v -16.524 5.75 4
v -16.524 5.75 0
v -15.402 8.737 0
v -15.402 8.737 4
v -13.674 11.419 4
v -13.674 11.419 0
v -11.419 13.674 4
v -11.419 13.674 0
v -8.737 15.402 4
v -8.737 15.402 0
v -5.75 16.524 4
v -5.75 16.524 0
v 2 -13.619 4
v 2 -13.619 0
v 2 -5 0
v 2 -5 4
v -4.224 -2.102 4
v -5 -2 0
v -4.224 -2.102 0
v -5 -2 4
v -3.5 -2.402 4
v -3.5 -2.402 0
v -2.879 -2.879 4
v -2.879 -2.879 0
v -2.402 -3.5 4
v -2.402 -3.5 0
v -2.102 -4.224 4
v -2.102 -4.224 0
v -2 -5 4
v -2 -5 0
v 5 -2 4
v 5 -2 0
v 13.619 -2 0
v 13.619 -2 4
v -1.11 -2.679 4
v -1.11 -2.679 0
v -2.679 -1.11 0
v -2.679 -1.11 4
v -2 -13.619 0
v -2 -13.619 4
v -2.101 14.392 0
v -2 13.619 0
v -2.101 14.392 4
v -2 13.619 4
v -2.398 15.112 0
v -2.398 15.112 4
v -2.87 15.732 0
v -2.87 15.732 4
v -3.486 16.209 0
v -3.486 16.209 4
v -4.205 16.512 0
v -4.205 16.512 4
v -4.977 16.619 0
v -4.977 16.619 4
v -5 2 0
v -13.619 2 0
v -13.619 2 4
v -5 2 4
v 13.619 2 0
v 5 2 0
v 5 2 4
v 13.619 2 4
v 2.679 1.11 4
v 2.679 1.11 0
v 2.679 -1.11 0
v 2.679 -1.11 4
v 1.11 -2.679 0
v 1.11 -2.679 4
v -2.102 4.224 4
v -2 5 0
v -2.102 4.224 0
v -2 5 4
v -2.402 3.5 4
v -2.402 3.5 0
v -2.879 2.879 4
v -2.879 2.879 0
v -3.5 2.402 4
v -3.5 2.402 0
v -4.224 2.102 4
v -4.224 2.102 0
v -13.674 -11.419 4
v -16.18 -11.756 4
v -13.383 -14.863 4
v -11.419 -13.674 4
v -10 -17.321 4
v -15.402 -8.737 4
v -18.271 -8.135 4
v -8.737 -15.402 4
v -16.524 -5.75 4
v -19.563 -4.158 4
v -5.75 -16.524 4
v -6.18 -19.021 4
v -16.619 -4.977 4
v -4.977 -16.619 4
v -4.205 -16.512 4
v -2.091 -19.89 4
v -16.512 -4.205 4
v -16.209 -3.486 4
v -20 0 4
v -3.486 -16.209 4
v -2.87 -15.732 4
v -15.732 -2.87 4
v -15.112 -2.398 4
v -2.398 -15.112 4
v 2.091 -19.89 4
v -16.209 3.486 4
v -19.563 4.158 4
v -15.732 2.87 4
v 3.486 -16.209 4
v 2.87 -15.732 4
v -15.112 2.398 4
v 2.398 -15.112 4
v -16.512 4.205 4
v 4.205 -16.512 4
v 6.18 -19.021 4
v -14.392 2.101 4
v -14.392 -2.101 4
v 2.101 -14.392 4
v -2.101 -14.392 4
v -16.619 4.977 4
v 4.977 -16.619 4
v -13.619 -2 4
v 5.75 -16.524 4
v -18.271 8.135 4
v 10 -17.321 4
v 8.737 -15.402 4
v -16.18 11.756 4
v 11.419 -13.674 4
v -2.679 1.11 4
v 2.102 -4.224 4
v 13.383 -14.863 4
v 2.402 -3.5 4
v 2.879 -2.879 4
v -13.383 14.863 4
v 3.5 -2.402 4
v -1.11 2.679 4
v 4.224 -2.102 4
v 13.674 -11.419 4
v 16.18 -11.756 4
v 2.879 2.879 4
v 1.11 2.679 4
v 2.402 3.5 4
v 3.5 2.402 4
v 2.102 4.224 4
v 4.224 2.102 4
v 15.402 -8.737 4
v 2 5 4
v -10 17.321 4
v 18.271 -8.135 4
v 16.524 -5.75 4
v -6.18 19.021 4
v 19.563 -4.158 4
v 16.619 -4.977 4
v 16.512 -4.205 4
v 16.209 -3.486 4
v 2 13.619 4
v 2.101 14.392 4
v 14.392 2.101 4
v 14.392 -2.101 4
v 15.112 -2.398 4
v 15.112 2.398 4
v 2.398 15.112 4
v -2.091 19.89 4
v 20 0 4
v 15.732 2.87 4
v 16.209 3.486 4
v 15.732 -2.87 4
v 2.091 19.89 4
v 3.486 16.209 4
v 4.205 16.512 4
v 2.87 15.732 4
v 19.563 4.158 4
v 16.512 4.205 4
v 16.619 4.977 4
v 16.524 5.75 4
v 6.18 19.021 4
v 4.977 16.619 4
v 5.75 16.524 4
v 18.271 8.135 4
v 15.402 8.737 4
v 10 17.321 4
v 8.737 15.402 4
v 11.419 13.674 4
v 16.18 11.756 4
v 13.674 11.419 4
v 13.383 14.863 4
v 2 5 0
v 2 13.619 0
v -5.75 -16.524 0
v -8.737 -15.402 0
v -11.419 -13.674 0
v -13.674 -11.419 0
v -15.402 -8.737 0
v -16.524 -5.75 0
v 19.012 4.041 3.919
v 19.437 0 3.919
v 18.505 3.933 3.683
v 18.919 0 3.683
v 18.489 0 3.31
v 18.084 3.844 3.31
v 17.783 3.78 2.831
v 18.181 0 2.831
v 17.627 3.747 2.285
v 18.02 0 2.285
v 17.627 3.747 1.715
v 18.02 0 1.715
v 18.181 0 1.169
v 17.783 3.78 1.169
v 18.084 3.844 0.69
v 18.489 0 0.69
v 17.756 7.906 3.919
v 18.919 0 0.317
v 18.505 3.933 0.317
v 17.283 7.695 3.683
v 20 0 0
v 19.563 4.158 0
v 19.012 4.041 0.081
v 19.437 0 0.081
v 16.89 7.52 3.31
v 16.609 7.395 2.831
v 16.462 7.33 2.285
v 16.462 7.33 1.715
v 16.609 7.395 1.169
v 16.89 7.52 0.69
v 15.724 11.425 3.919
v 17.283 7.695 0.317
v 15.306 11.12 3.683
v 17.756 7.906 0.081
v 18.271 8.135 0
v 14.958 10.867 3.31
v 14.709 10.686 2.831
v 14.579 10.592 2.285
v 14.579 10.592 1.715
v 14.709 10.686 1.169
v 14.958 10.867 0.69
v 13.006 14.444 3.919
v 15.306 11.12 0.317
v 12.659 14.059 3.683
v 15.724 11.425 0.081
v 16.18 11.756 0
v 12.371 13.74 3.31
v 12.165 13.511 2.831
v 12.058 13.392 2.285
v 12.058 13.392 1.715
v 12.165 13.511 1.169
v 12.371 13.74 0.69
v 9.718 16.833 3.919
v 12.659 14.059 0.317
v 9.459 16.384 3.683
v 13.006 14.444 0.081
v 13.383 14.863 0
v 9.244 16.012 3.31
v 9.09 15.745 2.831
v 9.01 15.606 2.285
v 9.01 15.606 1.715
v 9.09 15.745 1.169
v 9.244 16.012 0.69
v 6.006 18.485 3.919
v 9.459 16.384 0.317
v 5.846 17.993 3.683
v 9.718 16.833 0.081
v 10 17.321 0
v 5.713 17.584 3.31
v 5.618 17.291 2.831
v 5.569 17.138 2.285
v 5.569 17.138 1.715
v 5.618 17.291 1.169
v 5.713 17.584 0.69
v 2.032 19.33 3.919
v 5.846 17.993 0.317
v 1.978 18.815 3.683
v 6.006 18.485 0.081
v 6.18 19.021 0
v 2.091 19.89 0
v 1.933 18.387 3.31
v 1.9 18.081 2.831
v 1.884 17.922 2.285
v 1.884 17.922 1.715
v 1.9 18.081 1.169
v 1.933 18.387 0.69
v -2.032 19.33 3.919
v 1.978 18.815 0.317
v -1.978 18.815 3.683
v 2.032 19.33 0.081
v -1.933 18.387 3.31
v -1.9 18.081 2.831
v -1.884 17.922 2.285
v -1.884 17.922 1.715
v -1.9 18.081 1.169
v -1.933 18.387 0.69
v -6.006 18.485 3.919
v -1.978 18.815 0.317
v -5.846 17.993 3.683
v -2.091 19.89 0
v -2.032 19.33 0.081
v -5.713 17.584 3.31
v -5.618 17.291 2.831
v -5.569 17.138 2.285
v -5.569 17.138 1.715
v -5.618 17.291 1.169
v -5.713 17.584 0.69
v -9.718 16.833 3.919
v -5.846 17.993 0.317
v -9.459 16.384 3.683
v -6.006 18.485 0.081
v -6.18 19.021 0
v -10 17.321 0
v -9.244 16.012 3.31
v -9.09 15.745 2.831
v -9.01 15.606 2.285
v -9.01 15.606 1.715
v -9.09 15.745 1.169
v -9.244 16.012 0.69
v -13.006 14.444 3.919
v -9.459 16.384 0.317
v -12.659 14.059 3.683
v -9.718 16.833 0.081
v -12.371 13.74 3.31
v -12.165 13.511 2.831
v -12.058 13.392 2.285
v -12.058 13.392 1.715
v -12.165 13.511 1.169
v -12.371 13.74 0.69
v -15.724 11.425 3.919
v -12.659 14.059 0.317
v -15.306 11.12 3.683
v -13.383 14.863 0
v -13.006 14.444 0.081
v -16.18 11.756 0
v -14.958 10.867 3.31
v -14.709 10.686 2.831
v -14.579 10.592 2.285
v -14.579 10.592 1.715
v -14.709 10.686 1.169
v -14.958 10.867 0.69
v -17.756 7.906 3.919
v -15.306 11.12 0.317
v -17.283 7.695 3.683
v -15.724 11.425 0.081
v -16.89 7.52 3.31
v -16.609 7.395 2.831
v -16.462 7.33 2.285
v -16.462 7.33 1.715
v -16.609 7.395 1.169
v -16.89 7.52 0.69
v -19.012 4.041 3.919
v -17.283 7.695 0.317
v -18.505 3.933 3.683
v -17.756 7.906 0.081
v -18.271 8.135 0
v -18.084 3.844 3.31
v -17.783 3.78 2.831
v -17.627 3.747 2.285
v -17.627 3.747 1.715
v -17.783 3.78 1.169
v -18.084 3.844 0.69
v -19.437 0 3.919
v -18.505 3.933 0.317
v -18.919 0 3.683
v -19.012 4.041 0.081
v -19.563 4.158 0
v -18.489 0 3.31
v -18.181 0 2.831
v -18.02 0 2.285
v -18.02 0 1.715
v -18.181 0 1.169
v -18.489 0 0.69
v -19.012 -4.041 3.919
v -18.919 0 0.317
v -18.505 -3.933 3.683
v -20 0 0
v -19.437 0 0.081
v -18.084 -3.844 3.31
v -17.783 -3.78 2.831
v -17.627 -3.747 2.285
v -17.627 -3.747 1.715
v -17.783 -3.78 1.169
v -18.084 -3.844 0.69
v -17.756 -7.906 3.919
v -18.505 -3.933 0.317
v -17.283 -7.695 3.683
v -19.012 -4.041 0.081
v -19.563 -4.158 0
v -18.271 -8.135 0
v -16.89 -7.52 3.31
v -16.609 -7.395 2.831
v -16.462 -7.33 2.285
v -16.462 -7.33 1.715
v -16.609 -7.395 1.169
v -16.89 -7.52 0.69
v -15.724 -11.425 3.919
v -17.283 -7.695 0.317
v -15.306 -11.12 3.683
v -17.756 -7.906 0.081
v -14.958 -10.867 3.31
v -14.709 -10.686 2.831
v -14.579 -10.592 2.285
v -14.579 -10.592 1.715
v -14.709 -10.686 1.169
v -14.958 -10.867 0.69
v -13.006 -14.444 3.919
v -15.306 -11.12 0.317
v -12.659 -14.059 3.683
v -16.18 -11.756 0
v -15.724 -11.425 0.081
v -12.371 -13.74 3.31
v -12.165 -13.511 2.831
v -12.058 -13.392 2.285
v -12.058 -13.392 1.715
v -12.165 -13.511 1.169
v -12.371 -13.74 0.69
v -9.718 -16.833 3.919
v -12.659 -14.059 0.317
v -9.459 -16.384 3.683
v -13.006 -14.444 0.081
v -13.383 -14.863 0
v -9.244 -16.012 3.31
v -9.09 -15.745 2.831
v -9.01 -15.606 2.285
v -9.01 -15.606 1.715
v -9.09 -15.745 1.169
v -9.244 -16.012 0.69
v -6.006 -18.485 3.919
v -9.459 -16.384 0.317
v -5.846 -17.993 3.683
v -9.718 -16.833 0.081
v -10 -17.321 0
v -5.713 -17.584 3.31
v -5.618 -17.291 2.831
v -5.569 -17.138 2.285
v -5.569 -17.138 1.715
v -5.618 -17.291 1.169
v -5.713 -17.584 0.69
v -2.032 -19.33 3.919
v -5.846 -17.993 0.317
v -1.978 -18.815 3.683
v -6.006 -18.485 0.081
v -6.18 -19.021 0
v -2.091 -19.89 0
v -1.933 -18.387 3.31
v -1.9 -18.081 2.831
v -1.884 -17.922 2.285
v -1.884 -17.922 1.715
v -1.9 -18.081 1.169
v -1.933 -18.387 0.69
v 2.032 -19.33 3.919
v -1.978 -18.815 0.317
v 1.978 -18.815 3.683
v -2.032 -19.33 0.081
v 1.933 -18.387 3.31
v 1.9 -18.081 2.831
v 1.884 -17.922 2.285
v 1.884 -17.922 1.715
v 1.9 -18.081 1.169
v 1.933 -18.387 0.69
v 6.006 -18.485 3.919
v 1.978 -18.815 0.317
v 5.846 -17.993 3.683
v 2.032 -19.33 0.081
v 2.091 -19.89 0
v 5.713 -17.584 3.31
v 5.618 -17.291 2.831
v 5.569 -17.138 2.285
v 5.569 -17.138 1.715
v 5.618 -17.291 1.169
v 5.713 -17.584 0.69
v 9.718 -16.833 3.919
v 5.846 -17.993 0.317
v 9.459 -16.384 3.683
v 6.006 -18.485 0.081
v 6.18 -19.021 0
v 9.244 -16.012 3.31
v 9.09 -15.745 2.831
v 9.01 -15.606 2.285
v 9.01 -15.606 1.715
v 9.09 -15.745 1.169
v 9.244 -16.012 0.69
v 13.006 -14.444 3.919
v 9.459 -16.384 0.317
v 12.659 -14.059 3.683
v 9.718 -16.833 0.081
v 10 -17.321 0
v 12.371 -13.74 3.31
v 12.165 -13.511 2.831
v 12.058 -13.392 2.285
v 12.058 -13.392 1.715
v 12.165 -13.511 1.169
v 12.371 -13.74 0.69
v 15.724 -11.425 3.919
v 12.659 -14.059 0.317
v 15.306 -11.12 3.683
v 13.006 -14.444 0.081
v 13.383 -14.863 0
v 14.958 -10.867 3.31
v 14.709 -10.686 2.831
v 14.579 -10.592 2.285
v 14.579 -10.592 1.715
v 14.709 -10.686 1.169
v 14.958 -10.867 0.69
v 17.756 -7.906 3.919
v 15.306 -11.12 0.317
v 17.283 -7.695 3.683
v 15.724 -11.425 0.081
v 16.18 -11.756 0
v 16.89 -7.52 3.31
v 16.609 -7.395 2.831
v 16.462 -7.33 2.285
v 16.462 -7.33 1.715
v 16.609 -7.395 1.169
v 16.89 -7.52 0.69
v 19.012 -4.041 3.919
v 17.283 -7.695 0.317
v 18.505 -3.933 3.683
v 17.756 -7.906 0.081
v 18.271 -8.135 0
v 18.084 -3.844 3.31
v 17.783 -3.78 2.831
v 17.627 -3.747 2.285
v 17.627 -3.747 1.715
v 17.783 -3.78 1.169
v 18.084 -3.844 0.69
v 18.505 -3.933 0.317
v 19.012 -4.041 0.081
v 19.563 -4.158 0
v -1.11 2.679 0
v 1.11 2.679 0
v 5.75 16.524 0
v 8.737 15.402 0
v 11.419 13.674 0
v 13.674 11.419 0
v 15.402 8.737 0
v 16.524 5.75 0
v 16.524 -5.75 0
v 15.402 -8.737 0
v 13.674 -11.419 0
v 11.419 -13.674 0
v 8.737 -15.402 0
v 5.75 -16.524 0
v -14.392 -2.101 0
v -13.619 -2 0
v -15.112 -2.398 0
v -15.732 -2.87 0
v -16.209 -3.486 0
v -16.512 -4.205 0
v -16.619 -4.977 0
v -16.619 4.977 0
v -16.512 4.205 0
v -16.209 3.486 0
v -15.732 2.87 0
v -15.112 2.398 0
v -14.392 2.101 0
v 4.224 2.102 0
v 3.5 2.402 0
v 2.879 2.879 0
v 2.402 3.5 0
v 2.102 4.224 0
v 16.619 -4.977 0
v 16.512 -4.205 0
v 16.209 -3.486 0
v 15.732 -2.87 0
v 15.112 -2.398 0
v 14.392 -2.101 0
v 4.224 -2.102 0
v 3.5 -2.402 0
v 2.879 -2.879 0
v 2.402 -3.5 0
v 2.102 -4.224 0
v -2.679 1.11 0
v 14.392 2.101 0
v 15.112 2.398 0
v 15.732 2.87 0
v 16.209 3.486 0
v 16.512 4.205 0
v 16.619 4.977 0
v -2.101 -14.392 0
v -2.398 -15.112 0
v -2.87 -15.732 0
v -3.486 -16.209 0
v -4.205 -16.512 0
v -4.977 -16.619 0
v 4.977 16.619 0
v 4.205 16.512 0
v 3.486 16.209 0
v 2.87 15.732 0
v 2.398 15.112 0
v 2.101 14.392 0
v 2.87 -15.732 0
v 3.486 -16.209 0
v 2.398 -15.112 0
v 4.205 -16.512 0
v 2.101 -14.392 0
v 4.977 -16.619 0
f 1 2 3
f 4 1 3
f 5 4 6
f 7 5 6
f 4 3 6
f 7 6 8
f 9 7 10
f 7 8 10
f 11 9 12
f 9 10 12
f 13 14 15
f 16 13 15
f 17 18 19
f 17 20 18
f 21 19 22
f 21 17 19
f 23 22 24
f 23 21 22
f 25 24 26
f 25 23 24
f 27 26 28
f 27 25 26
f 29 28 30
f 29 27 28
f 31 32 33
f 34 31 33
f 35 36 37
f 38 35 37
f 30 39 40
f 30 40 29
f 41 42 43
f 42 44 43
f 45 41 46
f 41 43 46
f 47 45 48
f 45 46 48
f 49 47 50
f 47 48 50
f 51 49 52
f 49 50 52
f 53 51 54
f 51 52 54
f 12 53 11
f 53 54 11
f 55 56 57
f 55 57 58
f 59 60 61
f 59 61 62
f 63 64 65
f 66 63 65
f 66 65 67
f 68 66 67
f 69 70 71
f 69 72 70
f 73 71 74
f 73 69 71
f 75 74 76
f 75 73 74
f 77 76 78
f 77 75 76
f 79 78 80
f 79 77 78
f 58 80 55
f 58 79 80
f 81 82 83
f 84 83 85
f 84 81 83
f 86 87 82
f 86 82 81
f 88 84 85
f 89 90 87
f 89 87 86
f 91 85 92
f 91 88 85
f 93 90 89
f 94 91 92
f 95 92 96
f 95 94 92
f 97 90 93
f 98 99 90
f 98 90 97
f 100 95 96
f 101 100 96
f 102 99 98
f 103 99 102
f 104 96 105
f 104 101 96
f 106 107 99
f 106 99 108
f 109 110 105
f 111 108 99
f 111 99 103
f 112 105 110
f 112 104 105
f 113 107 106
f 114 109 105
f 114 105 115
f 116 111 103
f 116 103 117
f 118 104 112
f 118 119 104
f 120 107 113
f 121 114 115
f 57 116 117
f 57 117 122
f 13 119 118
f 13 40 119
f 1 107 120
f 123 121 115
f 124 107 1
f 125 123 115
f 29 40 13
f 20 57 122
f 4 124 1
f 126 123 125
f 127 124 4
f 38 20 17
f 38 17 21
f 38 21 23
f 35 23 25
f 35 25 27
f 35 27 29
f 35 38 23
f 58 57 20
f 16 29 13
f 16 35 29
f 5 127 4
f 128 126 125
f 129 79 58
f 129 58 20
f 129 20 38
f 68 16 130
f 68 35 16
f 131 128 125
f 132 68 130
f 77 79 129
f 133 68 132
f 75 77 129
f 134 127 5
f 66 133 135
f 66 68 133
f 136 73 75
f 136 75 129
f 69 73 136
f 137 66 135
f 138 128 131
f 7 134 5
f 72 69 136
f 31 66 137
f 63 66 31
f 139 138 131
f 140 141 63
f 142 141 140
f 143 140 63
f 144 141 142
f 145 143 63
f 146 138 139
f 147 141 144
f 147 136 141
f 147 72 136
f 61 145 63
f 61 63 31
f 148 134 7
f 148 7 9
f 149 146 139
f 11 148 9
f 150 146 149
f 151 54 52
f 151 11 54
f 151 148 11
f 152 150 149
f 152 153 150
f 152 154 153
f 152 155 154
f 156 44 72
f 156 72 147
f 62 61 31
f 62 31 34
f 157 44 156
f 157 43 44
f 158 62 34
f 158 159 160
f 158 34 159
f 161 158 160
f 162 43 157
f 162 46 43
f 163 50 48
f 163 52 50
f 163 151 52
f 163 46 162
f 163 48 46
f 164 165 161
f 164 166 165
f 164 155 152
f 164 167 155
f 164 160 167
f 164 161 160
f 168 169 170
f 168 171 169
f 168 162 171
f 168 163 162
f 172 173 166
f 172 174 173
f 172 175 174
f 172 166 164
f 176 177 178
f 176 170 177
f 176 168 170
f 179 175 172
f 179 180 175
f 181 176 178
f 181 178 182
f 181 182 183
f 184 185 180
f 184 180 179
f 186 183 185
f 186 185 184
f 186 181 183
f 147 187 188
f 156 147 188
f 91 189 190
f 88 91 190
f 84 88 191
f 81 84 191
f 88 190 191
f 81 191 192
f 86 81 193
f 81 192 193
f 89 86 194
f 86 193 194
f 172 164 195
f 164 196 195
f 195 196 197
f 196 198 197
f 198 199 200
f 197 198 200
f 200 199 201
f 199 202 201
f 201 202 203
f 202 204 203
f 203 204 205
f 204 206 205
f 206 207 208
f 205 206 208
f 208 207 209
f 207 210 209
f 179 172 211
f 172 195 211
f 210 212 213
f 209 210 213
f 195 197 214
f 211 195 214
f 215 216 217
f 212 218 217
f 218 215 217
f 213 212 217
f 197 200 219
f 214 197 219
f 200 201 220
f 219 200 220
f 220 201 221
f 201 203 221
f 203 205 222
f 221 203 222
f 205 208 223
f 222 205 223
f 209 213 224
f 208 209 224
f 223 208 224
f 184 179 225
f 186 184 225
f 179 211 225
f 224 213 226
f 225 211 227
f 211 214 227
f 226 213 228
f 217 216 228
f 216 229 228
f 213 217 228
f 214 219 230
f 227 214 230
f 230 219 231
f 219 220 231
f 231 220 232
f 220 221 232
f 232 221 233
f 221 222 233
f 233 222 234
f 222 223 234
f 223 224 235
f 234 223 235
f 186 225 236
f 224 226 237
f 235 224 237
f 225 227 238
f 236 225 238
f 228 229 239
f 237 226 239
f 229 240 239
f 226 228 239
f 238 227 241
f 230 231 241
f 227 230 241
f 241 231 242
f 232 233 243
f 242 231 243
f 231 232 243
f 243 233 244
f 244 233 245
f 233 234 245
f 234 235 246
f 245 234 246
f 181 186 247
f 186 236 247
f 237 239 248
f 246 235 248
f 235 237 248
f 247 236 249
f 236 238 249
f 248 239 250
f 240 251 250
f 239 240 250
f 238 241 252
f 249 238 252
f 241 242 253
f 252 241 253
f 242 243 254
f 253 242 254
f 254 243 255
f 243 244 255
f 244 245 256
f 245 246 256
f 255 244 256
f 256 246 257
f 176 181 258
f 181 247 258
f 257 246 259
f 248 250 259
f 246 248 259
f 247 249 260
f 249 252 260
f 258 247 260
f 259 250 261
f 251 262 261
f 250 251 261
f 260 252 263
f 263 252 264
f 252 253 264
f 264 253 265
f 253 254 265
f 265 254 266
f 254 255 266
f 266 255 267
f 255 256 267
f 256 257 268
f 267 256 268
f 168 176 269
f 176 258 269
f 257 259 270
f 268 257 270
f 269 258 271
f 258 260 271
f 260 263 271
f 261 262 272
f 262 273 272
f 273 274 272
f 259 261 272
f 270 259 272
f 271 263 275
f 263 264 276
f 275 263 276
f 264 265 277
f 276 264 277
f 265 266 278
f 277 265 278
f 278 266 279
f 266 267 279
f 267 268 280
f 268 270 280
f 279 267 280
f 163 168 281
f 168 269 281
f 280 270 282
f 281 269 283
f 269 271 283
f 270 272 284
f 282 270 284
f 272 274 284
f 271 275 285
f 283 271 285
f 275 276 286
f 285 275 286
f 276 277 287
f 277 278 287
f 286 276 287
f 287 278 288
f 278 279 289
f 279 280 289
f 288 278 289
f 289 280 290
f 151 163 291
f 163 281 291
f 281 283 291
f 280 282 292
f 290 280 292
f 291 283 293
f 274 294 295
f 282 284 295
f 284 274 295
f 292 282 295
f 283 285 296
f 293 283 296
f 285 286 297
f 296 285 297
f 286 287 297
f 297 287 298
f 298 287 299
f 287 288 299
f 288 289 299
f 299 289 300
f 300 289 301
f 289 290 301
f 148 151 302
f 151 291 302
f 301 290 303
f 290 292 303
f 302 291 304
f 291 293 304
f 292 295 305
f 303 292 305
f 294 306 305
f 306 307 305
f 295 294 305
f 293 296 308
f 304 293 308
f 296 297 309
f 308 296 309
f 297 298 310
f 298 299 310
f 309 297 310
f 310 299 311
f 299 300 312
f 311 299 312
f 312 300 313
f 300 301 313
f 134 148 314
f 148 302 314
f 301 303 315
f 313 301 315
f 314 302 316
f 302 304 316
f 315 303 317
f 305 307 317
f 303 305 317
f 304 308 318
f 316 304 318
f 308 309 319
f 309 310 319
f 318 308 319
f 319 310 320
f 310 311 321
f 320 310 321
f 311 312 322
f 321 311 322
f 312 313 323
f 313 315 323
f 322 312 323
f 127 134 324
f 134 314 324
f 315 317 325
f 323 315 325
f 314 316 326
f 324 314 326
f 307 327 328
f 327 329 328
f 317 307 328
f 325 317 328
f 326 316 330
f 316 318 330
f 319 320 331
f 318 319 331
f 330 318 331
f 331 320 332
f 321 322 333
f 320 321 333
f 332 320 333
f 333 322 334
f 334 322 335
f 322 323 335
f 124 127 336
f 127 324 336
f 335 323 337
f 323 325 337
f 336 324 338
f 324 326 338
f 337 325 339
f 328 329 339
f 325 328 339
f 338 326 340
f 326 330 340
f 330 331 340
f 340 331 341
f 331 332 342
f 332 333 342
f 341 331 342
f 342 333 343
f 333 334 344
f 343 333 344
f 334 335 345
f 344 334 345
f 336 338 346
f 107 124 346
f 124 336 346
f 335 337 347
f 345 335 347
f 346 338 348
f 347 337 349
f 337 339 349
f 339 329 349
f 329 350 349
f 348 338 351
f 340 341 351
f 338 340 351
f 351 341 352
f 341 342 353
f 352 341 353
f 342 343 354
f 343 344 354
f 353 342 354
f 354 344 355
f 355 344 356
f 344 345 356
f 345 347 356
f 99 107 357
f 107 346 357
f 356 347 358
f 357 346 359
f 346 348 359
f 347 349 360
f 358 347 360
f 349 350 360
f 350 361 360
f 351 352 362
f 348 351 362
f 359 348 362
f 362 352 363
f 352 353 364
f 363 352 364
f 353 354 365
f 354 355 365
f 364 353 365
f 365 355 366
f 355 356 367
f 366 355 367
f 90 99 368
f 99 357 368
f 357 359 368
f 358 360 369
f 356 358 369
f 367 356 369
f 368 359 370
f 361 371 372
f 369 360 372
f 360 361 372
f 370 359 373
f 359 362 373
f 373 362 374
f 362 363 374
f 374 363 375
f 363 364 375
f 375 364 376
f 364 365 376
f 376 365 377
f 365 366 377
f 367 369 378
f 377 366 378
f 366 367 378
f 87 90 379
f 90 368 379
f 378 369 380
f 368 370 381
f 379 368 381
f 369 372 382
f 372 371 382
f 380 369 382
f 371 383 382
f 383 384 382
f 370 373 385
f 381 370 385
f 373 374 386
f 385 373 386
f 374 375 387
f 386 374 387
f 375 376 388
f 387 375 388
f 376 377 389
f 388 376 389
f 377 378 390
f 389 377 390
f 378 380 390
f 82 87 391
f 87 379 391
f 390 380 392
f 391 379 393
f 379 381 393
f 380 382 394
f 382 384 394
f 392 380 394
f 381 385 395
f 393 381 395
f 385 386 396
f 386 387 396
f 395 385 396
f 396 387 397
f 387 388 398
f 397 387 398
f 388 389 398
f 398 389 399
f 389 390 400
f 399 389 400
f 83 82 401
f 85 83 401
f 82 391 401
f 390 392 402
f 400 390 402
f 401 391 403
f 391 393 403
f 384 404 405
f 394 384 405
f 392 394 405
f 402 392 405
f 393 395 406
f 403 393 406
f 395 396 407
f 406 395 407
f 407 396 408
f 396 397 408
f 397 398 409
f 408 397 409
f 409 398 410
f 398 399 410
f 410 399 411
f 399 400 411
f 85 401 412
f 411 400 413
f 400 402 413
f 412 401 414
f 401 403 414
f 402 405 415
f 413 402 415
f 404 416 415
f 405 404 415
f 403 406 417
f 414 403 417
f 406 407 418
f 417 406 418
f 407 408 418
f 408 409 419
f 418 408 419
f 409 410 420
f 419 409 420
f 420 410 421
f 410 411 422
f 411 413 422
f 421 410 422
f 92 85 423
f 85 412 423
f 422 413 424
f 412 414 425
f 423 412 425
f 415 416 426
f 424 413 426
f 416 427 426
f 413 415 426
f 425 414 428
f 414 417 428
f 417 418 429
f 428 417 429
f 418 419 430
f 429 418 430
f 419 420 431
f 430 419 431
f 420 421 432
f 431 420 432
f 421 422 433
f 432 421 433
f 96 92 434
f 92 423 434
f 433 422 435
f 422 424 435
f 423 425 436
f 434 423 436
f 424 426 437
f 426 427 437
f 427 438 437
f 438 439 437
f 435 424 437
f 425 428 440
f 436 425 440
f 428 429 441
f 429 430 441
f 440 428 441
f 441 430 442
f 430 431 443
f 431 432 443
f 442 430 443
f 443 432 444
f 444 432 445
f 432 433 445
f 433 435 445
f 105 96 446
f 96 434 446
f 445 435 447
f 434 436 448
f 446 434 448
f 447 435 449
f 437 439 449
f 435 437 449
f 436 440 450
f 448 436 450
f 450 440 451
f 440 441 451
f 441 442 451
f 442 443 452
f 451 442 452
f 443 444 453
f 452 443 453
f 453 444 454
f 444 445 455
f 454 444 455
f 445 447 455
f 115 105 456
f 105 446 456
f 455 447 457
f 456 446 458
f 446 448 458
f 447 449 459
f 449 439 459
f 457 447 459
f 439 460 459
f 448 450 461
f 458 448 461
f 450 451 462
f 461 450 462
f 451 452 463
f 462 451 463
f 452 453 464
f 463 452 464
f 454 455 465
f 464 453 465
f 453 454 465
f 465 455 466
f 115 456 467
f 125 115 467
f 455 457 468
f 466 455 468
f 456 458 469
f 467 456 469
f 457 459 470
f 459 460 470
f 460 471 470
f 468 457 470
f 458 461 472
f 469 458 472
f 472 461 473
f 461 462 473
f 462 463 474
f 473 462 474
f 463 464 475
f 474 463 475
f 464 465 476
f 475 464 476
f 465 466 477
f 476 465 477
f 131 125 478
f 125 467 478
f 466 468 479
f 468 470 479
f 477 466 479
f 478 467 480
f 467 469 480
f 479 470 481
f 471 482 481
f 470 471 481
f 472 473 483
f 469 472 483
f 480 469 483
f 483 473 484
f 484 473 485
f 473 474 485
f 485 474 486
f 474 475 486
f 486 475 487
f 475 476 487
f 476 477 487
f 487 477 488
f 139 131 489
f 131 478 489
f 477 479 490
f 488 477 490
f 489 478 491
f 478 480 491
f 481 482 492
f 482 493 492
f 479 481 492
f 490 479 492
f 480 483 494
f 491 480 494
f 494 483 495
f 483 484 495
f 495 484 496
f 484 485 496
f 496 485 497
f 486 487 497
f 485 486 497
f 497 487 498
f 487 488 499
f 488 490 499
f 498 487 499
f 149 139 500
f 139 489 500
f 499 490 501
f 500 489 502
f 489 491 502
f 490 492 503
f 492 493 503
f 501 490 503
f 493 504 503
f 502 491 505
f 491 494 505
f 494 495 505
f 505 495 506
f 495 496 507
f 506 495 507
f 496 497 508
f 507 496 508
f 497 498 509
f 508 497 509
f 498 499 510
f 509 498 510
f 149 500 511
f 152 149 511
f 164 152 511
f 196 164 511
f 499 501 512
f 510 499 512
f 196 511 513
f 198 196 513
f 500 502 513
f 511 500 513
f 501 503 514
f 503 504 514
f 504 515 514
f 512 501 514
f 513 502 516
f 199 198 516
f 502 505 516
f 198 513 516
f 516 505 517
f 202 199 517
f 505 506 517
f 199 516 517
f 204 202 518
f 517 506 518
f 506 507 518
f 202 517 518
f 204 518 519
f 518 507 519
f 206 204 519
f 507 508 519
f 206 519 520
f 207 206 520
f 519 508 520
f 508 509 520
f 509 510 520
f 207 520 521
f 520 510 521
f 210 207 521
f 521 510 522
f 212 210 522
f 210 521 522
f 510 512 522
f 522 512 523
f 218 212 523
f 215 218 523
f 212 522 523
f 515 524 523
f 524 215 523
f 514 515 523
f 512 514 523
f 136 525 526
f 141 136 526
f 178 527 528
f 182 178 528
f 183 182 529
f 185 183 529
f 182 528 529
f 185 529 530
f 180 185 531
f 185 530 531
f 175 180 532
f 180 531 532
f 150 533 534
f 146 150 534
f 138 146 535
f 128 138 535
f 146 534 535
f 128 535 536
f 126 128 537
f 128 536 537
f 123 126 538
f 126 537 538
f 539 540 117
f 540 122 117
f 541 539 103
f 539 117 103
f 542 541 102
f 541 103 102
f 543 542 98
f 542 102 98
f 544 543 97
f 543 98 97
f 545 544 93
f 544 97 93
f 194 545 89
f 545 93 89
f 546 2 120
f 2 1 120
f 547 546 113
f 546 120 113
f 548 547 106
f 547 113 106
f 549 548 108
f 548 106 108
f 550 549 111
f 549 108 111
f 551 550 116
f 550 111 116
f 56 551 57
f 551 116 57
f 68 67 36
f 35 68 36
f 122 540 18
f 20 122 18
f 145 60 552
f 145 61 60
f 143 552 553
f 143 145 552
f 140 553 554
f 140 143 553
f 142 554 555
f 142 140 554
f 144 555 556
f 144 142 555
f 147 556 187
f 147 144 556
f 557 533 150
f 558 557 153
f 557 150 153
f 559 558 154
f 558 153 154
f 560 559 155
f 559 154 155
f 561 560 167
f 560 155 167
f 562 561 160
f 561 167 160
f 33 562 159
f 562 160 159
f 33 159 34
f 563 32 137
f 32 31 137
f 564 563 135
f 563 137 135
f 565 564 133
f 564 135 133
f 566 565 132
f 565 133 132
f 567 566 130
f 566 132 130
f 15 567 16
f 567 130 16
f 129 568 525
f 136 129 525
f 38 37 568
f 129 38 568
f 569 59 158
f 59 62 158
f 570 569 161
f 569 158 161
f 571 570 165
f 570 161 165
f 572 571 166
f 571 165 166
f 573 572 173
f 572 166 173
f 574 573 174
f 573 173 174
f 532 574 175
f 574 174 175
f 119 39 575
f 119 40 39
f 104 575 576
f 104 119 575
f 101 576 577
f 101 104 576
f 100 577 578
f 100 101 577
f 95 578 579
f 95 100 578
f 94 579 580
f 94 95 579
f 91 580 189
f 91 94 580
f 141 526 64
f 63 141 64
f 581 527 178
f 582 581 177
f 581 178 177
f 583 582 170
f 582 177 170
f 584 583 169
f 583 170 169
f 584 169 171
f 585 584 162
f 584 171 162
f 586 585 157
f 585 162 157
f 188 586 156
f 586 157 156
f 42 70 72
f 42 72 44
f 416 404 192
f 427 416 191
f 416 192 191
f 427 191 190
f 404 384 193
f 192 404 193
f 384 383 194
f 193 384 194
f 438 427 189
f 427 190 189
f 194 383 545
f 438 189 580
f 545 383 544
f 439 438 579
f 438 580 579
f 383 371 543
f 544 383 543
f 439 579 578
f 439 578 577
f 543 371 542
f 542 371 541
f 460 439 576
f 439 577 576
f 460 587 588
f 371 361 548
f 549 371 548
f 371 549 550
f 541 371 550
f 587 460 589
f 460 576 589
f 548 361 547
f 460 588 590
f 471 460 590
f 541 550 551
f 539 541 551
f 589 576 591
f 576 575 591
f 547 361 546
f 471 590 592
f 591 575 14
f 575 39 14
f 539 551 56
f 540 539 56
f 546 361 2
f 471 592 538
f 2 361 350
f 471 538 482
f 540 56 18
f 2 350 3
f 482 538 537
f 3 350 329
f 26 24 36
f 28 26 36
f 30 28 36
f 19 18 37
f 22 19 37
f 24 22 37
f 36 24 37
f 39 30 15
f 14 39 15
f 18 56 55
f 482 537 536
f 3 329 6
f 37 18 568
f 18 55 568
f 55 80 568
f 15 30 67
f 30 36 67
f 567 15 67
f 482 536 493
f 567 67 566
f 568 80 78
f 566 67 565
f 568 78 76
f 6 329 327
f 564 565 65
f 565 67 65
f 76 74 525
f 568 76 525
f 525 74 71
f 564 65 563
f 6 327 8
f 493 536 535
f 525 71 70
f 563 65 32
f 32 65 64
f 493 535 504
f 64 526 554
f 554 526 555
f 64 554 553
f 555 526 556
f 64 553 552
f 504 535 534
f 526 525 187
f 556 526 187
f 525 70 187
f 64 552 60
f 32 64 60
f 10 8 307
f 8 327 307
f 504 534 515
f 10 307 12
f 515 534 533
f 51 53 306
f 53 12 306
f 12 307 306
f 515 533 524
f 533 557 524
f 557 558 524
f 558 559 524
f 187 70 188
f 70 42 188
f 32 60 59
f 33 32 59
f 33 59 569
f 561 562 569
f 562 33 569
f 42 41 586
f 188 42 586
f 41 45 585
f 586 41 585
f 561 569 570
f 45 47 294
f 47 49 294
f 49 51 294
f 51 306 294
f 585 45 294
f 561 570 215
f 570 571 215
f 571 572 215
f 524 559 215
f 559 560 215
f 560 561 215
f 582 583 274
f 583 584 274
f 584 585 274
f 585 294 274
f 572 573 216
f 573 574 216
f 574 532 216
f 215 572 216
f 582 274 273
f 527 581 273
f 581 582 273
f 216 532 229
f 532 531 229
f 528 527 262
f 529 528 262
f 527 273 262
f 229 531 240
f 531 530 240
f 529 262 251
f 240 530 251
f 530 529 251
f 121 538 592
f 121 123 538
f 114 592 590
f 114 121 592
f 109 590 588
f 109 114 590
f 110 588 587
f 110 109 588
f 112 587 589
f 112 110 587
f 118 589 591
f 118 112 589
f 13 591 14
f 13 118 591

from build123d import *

# Parameters (mm, degrees)
TORUS_R         = 2
CYLINDER_R      = 20
CYLINDER_DEPTH  = 4
POCKET_DEPTH    = 4.001
FILLET_R        = 3
FILLET001_R     = 3
FILLET002_R     = 3
POCKET001_DEPTH = 5


with BuildPart() as torus:
    # Torus → Torus (revolve)
    with BuildSketch(Plane(origin=(0, 0, 2), x_dir=(1, 0, 0), z_dir=(0, -1, 0))):
        with Locations((20, 0)):
            Circle(TORUS_R)
    revolve(axis=Axis((0, 0, 2), (0, 0, 1)))


with BuildPart() as body001:
    # Cylinder → Cylinder (new body)
    with BuildSketch(Plane.XY):
        Circle(CYLINDER_R)
    extrude(amount=CYLINDER_DEPTH)

    # Sketch001 (on DatumPlane) → Pocket (cut, through all)
    with BuildSketch(Plane(origin=(0, 0, 0), x_dir=(1, 0, 0), z_dir=(0, 0, -1))):
        with BuildLine():
            Line((2, 17), (2, 2))
            Line((2, 2), (17, 2))
            ThreePointArc((17, 2), (12.606602, 12.606602), (2, 17))
        make_face()
        with BuildLine():
            Line((-2, 17), (-2, 2))
            Line((-17, 2), (-2, 2))
            ThreePointArc((-2, 17), (-12.606602, 12.606602), (-17, 2))
        make_face()
        with BuildLine():
            Line((2, -2), (17, -2))
            ThreePointArc((2, -17), (12.606602, -12.606602), (17, -2))
            Line((2, -2), (2, -17))
        make_face()
        with BuildLine():
            Line((-2, -2), (-2, -17))
            ThreePointArc((-17, -2), (-12.606602, -12.606602), (-2, -17))
            Line((-17, -2), (-2, -2))
        make_face()
    extrude(amount=-POCKET_DEPTH, mode=Mode.SUBTRACT)

    # Fillet
    fillet_edges = [body001.edges().sort_by_distance(p)[0] for p in [
        (-2, -17, 2),
    ]]
    fillet(fillet_edges, radius=FILLET_R)

    # Fillet001
    fillet001_edges = [body001.edges().sort_by_distance(p)[0] for p in [
        (-17, 2, 2),
        (2, -17, 2),
        (17, -2, 2),
        (-17, -2, 2),
        (-2, 17, 2),
        (2, 17, 2),
        (17, 2, 2),
    ]]
    fillet(fillet001_edges, radius=FILLET001_R)

    # Fillet002
    fillet002_edges = [body001.edges().sort_by_distance(p)[0] for p in [
        (2, -2, 2),
        (2, 2, 2),
        (-2, 2, 2),
        (-2, -2, 2),
    ]]
    fillet(fillet002_edges, radius=FILLET002_R)

    # Cut: cut Torus
    add(torus.part, mode=Mode.SUBTRACT)

    # Sketch (on DatumPlane) → Pocket001 (cut)
    with BuildSketch(Plane(origin=(0, 0, 0), x_dir=(1, 0, 0), z_dir=(0, 0, -1))):
        Polygon((1.109782, -2.679251), (2.679251, -1.109782), (2.679251, 1.109782), (1.109782, 2.679251), (-1.109782, 2.679251), (-2.679251, 1.109782), (-2.679251, -1.109782), (-1.109782, -2.679251), align=None)
    extrude(amount=-POCKET001_DEPTH, mode=Mode.SUBTRACT)


solid = body001.part
